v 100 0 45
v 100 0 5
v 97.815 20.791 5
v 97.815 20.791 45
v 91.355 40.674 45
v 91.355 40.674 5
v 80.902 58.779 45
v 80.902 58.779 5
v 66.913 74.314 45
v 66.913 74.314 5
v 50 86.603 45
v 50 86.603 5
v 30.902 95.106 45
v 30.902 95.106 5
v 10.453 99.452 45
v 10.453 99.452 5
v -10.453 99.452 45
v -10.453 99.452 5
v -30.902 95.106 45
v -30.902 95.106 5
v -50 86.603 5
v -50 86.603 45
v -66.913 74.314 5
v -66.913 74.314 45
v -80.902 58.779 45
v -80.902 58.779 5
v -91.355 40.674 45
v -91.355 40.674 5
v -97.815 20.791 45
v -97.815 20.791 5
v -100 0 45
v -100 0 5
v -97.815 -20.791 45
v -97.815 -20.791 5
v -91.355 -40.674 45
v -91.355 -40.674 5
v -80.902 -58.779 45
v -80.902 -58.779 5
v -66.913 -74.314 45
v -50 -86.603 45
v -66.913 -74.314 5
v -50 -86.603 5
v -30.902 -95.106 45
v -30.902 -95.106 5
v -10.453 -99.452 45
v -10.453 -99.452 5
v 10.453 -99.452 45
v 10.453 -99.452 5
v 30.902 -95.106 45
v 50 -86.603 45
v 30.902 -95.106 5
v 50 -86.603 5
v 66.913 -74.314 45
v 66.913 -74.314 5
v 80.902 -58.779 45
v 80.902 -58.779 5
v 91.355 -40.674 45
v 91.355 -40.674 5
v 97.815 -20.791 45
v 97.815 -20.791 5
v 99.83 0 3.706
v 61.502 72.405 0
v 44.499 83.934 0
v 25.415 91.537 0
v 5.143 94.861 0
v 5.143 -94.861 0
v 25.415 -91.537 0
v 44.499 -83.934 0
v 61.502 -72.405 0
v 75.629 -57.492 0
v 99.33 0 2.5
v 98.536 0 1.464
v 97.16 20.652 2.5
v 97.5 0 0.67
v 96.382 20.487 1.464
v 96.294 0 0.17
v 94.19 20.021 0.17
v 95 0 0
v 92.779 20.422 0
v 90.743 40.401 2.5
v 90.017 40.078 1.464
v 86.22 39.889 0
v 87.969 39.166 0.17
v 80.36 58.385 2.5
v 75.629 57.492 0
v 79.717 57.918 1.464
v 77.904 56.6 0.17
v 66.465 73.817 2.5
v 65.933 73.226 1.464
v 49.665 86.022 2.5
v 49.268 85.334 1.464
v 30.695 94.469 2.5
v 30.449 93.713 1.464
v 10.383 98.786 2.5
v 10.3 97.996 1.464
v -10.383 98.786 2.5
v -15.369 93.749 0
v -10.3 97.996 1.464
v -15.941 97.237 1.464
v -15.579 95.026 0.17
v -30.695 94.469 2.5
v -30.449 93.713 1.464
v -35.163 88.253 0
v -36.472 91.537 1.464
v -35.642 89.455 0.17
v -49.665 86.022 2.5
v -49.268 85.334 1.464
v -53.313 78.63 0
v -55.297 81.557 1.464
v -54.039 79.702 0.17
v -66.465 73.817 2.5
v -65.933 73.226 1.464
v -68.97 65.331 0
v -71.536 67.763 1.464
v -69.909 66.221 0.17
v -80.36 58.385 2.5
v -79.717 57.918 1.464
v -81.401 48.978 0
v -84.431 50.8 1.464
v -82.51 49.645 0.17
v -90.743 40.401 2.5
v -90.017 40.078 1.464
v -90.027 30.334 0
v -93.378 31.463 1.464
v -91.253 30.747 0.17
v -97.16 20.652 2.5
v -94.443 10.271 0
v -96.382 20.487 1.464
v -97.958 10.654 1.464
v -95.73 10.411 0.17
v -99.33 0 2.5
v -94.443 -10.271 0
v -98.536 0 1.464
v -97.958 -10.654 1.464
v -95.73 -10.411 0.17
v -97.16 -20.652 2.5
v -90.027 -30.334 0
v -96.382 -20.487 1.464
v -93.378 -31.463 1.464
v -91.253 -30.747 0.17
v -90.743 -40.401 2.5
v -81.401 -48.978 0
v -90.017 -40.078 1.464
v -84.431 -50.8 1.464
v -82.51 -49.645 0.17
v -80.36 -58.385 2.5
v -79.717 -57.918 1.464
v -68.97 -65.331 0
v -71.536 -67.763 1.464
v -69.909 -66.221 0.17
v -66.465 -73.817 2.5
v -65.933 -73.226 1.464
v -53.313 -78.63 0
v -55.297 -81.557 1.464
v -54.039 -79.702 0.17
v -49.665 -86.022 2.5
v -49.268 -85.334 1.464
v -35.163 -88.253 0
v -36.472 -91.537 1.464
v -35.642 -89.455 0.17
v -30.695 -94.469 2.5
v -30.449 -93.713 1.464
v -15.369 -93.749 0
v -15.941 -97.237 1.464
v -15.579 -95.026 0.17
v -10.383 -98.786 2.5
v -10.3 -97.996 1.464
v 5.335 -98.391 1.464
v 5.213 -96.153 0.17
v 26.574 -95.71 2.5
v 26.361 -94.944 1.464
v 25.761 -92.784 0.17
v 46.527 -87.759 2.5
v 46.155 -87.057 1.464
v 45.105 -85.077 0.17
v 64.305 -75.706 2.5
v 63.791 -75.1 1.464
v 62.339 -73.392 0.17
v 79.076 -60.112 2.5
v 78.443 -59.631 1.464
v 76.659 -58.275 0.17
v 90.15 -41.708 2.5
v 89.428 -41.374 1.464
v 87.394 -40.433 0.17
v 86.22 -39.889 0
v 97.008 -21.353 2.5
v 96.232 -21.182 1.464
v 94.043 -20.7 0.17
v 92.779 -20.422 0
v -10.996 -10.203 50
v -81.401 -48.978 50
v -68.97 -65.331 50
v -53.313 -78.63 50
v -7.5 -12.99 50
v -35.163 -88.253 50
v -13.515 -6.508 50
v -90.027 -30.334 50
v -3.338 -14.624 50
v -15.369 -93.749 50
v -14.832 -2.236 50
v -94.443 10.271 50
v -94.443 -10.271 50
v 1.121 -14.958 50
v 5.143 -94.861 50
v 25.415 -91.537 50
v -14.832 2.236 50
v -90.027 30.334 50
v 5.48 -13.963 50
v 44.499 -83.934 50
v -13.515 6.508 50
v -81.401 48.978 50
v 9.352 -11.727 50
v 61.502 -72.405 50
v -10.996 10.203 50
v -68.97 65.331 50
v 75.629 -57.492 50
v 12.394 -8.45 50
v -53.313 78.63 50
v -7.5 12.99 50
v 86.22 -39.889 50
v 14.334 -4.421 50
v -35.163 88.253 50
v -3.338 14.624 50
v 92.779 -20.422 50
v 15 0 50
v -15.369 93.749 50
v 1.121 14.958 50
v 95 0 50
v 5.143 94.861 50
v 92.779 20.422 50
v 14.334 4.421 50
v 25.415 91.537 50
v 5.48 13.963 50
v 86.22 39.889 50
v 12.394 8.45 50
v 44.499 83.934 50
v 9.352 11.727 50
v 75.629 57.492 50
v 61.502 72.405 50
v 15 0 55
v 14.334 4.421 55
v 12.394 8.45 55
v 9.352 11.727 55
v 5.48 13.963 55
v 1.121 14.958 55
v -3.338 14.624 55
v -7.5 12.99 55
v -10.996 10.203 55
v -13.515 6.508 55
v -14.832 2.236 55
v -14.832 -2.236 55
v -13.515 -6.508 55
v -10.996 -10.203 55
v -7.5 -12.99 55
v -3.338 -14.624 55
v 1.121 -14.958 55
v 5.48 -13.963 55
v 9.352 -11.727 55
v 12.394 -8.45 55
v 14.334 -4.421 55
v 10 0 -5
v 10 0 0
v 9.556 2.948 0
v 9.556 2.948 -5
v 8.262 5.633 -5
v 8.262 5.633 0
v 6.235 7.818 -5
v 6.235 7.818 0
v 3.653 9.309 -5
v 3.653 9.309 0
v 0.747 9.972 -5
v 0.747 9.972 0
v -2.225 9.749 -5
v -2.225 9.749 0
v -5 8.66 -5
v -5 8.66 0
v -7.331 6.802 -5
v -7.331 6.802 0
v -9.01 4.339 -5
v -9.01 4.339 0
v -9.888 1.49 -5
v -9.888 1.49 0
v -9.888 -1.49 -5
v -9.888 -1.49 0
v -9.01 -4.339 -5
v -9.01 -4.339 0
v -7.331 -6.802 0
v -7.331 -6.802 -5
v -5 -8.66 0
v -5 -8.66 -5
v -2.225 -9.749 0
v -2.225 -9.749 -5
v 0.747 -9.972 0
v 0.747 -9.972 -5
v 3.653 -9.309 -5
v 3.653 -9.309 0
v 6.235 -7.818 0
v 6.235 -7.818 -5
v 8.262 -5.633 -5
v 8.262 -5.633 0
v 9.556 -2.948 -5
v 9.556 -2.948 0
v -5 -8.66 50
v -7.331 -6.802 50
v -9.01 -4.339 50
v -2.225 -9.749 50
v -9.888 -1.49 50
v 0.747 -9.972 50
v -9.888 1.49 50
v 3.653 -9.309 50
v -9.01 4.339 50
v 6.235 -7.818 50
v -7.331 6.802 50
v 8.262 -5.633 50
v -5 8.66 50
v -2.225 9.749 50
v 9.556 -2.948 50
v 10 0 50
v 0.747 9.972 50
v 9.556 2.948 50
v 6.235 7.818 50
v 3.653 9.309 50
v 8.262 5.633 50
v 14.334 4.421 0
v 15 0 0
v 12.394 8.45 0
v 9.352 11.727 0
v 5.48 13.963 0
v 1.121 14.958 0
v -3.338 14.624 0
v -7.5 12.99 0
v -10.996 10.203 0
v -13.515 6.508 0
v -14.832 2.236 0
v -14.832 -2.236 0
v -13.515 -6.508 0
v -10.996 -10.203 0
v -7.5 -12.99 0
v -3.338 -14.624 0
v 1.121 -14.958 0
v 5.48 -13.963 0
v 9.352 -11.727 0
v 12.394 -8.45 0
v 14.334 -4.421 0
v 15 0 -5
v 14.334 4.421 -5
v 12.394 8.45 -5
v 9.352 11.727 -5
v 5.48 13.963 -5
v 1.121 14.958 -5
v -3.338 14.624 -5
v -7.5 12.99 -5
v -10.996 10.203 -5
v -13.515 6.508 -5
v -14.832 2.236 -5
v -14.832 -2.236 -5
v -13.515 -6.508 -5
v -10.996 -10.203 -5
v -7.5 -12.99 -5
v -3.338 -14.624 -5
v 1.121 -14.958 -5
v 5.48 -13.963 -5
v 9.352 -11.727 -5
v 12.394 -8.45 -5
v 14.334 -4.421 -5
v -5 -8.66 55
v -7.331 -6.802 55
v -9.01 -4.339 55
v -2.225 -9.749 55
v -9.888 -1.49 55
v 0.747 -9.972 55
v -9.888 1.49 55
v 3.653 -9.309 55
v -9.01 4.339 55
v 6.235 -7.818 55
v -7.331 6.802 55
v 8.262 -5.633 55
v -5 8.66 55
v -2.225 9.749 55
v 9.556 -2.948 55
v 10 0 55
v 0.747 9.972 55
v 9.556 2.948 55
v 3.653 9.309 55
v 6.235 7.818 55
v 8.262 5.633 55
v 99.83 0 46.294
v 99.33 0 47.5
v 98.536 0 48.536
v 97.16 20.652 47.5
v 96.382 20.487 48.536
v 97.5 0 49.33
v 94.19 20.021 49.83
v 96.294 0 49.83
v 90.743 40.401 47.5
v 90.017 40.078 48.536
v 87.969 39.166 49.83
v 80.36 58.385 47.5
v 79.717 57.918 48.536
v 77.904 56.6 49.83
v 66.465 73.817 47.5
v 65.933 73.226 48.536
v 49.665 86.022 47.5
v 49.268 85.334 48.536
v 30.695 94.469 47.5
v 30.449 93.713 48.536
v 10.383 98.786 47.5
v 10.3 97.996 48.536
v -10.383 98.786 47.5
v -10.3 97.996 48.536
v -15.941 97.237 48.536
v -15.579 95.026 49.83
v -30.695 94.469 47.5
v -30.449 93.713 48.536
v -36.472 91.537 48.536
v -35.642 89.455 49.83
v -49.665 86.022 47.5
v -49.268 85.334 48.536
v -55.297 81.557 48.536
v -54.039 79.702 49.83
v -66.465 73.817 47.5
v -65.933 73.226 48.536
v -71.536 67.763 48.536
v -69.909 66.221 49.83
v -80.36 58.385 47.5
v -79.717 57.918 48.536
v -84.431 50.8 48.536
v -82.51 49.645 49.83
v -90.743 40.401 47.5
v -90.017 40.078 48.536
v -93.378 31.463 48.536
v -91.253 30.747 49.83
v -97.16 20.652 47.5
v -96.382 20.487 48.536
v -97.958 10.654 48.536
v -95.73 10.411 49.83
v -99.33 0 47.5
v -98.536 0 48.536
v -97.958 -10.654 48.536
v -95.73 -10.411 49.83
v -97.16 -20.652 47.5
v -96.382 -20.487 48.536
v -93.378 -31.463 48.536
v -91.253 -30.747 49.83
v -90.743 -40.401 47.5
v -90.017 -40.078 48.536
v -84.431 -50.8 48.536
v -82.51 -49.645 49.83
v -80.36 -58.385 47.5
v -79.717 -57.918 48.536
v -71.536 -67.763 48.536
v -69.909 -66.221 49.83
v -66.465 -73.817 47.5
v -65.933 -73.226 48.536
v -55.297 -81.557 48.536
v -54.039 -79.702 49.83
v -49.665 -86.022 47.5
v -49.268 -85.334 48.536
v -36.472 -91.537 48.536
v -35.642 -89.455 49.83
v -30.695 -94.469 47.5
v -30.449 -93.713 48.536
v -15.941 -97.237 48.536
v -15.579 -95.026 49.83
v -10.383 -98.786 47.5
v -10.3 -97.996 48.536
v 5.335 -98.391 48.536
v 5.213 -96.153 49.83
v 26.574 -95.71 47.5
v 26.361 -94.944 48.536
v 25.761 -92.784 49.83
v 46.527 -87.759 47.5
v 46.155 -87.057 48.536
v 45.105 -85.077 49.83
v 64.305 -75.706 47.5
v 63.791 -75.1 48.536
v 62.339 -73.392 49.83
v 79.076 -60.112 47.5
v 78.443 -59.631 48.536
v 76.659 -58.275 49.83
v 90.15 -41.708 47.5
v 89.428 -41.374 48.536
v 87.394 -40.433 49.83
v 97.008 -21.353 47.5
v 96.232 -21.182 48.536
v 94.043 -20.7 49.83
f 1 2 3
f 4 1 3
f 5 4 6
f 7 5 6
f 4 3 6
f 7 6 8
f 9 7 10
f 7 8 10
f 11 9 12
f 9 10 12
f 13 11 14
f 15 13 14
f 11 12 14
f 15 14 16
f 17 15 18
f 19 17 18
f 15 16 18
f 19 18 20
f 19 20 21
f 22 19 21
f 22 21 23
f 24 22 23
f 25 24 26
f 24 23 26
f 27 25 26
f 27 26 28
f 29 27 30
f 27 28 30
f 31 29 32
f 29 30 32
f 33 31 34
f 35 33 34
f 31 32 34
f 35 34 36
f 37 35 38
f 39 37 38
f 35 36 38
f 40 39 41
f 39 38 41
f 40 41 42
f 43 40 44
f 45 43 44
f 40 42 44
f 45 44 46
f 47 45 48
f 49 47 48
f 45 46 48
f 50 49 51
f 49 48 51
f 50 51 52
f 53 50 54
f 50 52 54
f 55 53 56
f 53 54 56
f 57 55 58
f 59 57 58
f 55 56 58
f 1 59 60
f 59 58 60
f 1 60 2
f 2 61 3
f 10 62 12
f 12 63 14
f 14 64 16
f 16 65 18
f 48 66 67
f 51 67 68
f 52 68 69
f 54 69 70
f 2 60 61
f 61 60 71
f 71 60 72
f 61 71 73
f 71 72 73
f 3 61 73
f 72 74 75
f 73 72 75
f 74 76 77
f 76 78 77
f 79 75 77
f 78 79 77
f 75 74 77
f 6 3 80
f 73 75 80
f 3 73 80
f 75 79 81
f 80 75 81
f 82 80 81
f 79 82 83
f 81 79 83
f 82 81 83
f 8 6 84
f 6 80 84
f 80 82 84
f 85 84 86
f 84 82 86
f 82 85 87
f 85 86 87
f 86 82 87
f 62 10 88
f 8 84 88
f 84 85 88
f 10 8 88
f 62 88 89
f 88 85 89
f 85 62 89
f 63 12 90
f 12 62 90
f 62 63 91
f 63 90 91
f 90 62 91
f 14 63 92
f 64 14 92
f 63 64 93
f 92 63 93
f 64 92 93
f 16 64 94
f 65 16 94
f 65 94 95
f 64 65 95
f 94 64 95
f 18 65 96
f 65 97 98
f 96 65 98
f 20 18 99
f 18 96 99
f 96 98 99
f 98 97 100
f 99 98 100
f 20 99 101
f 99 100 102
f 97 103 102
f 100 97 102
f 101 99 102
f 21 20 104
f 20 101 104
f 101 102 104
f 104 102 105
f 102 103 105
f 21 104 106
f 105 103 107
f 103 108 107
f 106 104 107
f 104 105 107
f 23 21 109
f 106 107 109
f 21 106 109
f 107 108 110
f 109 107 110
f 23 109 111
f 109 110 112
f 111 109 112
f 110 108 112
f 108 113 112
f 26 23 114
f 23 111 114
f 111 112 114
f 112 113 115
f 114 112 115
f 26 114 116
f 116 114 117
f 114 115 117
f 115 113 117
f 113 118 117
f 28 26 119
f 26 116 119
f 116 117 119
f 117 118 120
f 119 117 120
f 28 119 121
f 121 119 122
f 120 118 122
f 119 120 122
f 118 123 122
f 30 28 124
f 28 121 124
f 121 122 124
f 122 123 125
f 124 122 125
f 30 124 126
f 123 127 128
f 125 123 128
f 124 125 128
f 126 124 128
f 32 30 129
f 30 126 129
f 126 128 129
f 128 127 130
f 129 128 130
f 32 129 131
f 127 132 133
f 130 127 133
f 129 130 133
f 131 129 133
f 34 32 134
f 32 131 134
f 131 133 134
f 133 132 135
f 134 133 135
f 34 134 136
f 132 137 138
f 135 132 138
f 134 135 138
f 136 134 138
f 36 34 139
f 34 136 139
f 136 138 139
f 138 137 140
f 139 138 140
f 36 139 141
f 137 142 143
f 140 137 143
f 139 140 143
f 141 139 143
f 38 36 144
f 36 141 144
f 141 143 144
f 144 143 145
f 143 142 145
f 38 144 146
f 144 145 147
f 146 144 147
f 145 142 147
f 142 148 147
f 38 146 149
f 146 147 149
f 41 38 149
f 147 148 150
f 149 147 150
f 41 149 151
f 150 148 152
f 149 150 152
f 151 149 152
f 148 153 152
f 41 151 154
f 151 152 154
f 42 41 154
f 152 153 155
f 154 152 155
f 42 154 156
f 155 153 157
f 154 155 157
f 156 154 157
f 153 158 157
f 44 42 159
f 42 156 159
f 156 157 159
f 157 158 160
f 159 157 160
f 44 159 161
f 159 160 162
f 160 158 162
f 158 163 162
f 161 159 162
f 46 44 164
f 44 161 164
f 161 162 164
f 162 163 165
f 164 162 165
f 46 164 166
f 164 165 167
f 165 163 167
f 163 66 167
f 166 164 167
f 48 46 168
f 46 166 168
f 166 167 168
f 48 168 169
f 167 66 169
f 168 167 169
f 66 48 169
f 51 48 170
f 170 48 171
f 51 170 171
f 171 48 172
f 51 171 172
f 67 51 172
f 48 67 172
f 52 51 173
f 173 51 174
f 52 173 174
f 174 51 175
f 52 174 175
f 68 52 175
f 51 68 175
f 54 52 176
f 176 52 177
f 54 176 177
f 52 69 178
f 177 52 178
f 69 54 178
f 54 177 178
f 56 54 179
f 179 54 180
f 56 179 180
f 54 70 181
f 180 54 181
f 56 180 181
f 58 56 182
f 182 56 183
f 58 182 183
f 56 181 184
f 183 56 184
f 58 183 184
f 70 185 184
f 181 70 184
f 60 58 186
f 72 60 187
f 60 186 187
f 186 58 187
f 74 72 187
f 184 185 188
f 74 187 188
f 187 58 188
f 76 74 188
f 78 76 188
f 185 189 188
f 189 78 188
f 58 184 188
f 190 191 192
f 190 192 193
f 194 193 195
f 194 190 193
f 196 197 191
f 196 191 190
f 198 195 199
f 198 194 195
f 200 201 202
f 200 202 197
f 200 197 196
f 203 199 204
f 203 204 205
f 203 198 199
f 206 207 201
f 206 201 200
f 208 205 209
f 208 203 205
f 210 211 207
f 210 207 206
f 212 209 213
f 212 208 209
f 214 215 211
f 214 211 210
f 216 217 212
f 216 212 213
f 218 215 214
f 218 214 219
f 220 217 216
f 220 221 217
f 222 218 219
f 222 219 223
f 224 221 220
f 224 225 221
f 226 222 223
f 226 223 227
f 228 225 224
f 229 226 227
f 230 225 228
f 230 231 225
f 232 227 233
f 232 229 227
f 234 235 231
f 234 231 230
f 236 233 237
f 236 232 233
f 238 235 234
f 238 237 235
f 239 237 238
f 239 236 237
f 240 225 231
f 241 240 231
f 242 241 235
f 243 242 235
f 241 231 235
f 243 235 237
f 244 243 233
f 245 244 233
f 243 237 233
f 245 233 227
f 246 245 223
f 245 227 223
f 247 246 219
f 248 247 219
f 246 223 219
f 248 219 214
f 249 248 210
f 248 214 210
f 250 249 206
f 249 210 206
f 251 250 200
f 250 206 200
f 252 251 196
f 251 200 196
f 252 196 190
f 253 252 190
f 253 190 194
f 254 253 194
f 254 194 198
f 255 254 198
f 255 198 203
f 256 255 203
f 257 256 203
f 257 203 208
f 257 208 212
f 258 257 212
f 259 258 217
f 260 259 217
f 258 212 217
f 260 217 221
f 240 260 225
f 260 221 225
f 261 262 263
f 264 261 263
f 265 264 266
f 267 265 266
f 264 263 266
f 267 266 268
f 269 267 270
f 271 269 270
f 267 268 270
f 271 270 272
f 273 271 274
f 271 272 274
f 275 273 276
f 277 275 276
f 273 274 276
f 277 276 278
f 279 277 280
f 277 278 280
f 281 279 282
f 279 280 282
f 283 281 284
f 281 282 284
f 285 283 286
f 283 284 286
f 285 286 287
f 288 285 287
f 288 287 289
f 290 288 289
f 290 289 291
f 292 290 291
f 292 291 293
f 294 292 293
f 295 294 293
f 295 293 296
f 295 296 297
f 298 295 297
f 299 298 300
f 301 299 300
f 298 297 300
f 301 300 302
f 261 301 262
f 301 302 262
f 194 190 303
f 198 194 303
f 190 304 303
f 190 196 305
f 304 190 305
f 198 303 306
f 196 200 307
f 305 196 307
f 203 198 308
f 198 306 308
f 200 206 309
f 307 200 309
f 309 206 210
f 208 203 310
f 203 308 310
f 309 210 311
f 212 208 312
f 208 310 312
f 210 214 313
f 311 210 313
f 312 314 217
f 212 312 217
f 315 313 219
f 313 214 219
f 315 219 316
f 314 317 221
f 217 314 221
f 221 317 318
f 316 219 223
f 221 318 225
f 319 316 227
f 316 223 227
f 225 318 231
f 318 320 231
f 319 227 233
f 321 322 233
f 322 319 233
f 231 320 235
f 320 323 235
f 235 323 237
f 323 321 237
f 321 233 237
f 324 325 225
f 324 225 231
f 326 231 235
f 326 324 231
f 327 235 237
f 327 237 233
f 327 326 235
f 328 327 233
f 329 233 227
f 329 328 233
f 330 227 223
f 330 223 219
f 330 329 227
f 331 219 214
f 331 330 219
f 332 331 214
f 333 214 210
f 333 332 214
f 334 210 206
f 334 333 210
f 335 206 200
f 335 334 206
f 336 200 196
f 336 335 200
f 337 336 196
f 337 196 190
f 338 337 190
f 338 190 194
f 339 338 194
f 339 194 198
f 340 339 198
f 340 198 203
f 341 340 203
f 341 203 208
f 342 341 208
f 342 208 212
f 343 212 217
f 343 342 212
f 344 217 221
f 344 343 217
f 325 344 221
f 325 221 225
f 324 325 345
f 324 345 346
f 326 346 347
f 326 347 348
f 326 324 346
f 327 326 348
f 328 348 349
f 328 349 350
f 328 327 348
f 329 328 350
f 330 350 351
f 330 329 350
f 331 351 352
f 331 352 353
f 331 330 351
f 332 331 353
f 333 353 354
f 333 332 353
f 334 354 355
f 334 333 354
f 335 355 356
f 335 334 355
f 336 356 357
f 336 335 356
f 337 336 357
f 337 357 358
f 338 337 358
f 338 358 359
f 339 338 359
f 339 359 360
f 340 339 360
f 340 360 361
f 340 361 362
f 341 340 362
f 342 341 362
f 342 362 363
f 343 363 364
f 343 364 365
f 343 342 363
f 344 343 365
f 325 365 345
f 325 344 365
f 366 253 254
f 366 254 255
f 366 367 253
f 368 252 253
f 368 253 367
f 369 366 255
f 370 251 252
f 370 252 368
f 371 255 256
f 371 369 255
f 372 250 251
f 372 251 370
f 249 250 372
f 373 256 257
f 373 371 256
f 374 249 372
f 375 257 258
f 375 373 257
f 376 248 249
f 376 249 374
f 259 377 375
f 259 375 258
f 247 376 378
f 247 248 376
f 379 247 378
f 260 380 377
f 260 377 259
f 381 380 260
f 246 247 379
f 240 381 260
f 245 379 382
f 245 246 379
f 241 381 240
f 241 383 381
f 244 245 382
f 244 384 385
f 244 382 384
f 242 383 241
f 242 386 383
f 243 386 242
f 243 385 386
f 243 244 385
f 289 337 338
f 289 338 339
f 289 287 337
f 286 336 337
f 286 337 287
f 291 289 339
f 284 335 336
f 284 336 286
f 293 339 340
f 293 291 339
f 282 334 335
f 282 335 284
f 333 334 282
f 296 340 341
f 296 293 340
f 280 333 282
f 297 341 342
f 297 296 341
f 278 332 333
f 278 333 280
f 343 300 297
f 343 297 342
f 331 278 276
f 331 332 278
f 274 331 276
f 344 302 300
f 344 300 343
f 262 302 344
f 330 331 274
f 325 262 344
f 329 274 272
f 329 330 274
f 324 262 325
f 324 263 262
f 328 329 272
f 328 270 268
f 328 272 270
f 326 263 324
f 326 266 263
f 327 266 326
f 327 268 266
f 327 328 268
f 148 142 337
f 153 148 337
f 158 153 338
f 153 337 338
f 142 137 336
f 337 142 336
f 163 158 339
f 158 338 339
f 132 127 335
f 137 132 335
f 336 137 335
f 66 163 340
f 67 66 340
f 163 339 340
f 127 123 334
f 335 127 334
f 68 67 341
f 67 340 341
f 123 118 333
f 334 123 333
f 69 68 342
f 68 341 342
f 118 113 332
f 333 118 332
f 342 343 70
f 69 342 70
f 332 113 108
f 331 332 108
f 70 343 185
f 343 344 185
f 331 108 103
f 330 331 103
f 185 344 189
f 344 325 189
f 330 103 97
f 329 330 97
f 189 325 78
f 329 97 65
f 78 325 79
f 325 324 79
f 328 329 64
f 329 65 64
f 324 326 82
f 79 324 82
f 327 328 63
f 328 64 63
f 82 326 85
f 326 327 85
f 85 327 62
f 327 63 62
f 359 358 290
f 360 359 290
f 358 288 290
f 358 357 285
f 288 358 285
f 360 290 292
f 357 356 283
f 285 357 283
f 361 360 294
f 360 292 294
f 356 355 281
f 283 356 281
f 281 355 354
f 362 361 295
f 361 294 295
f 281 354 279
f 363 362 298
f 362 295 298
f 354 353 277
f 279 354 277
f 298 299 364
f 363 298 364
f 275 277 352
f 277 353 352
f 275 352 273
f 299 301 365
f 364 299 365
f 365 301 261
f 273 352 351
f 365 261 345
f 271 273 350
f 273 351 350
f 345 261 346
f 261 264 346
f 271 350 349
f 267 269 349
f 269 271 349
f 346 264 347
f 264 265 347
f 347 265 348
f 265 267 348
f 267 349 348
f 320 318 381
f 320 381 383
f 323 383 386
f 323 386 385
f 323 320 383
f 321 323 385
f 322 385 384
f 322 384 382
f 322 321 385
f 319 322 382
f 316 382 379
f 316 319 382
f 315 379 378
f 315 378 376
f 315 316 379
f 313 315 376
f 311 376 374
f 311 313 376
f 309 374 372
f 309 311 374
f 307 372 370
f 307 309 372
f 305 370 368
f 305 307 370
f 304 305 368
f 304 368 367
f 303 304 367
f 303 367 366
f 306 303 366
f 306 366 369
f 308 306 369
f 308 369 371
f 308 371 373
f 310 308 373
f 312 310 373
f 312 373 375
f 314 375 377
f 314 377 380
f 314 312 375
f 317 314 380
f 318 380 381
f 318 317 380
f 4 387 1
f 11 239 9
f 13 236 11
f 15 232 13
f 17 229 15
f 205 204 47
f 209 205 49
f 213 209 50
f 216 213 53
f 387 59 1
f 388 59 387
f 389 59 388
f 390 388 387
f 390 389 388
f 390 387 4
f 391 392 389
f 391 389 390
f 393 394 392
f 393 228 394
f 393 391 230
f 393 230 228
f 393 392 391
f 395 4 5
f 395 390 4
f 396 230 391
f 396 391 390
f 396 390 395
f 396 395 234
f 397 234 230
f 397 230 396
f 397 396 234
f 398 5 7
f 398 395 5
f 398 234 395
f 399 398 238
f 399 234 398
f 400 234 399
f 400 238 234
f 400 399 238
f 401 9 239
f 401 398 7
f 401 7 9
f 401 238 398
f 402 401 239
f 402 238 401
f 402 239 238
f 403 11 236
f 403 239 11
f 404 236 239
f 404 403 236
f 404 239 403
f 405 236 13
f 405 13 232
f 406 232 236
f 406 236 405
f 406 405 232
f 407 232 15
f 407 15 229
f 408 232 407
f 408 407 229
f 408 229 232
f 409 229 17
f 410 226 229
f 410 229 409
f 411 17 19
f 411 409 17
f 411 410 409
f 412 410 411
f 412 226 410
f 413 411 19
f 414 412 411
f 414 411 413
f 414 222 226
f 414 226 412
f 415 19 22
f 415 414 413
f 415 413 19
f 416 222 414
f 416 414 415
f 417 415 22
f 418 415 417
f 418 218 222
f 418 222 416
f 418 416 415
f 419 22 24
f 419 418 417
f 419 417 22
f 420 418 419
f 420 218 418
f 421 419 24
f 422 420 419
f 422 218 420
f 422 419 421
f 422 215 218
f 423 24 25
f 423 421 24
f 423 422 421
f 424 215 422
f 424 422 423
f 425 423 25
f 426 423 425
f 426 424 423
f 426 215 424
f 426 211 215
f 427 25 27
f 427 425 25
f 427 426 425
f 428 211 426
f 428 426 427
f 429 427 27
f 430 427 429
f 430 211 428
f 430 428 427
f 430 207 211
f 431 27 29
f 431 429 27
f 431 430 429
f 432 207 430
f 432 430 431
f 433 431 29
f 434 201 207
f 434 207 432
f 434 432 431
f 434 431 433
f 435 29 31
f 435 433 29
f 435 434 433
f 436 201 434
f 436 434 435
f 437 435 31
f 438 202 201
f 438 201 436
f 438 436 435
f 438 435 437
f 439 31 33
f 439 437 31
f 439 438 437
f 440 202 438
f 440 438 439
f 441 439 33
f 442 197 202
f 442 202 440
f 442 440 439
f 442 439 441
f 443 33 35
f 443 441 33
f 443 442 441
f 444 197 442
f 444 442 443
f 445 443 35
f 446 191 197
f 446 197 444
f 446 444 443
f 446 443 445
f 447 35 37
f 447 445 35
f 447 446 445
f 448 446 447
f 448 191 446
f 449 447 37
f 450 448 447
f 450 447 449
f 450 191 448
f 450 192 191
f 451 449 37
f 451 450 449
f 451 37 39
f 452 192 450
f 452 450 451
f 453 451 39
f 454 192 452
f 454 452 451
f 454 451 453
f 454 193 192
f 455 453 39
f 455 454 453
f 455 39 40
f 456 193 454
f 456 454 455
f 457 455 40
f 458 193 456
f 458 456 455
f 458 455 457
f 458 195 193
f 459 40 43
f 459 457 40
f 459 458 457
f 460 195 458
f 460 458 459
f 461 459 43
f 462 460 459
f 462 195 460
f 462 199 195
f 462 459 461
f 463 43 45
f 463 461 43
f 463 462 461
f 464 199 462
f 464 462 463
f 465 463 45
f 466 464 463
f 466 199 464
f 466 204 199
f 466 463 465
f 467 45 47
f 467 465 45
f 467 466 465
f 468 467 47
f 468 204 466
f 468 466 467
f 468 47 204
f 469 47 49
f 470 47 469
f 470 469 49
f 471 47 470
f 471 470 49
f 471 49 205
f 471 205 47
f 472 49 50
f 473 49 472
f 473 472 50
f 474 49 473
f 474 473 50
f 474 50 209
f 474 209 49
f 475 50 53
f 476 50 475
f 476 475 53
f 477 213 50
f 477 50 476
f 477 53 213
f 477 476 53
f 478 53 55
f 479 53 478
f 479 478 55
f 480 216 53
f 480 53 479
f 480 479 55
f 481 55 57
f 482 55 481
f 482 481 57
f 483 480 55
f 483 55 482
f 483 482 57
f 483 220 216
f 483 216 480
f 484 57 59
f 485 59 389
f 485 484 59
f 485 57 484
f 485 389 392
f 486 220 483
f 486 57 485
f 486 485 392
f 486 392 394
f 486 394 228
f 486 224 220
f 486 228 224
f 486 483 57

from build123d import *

# Parameters (mm, degrees)
SKETCH1_R           = 100
SKETCH1_R_2         = 15
BOSS_EXTRUDE1_DEPTH = 50
FILLET1_R           = 5
SKETCH1_5_R         = 15
SKETCH1_5_R_2       = 10
BOSS_EXTRUDE2_DEPTH = 5
BOSS_EXTRUDE3_START = 50
SKETCH1_6_R         = 15
SKETCH1_6_R_2       = 10
BOSS_EXTRUDE3_DEPTH = 5


with BuildPart() as part:
    # Sketch1 → Boss-Extrude1 (new body)
    with BuildSketch(Plane.XY):
        Circle(SKETCH1_R)
        Circle(SKETCH1_R_2, mode=Mode.SUBTRACT)
    extrude(amount=BOSS_EXTRUDE1_DEPTH)

    # Fillet1
    fillet1_edges = [part.edges().sort_by_distance(p)[0] for p in [
        (-100, 0, 50),
        (-100, 0, 0),
    ]]
    fillet(fillet1_edges, radius=FILLET1_R)


with BuildPart() as body_2:
    # Sketch1<5> → Boss-Extrude2 (new body)
    with BuildSketch(Plane.XY):
        Circle(SKETCH1_5_R)
        Circle(SKETCH1_5_R_2, mode=Mode.SUBTRACT)
    extrude(amount=-BOSS_EXTRUDE2_DEPTH)


with BuildPart() as body_3:
    # Sketch1<6> → Boss-Extrude3 (new body)
    with BuildSketch(Plane.XY.offset(BOSS_EXTRUDE3_START)):
        Circle(SKETCH1_6_R)
        Circle(SKETCH1_6_R_2, mode=Mode.SUBTRACT)
    extrude(amount=BOSS_EXTRUDE3_DEPTH)


solid = Compound([part.part, body_2.part, body_3.part])
